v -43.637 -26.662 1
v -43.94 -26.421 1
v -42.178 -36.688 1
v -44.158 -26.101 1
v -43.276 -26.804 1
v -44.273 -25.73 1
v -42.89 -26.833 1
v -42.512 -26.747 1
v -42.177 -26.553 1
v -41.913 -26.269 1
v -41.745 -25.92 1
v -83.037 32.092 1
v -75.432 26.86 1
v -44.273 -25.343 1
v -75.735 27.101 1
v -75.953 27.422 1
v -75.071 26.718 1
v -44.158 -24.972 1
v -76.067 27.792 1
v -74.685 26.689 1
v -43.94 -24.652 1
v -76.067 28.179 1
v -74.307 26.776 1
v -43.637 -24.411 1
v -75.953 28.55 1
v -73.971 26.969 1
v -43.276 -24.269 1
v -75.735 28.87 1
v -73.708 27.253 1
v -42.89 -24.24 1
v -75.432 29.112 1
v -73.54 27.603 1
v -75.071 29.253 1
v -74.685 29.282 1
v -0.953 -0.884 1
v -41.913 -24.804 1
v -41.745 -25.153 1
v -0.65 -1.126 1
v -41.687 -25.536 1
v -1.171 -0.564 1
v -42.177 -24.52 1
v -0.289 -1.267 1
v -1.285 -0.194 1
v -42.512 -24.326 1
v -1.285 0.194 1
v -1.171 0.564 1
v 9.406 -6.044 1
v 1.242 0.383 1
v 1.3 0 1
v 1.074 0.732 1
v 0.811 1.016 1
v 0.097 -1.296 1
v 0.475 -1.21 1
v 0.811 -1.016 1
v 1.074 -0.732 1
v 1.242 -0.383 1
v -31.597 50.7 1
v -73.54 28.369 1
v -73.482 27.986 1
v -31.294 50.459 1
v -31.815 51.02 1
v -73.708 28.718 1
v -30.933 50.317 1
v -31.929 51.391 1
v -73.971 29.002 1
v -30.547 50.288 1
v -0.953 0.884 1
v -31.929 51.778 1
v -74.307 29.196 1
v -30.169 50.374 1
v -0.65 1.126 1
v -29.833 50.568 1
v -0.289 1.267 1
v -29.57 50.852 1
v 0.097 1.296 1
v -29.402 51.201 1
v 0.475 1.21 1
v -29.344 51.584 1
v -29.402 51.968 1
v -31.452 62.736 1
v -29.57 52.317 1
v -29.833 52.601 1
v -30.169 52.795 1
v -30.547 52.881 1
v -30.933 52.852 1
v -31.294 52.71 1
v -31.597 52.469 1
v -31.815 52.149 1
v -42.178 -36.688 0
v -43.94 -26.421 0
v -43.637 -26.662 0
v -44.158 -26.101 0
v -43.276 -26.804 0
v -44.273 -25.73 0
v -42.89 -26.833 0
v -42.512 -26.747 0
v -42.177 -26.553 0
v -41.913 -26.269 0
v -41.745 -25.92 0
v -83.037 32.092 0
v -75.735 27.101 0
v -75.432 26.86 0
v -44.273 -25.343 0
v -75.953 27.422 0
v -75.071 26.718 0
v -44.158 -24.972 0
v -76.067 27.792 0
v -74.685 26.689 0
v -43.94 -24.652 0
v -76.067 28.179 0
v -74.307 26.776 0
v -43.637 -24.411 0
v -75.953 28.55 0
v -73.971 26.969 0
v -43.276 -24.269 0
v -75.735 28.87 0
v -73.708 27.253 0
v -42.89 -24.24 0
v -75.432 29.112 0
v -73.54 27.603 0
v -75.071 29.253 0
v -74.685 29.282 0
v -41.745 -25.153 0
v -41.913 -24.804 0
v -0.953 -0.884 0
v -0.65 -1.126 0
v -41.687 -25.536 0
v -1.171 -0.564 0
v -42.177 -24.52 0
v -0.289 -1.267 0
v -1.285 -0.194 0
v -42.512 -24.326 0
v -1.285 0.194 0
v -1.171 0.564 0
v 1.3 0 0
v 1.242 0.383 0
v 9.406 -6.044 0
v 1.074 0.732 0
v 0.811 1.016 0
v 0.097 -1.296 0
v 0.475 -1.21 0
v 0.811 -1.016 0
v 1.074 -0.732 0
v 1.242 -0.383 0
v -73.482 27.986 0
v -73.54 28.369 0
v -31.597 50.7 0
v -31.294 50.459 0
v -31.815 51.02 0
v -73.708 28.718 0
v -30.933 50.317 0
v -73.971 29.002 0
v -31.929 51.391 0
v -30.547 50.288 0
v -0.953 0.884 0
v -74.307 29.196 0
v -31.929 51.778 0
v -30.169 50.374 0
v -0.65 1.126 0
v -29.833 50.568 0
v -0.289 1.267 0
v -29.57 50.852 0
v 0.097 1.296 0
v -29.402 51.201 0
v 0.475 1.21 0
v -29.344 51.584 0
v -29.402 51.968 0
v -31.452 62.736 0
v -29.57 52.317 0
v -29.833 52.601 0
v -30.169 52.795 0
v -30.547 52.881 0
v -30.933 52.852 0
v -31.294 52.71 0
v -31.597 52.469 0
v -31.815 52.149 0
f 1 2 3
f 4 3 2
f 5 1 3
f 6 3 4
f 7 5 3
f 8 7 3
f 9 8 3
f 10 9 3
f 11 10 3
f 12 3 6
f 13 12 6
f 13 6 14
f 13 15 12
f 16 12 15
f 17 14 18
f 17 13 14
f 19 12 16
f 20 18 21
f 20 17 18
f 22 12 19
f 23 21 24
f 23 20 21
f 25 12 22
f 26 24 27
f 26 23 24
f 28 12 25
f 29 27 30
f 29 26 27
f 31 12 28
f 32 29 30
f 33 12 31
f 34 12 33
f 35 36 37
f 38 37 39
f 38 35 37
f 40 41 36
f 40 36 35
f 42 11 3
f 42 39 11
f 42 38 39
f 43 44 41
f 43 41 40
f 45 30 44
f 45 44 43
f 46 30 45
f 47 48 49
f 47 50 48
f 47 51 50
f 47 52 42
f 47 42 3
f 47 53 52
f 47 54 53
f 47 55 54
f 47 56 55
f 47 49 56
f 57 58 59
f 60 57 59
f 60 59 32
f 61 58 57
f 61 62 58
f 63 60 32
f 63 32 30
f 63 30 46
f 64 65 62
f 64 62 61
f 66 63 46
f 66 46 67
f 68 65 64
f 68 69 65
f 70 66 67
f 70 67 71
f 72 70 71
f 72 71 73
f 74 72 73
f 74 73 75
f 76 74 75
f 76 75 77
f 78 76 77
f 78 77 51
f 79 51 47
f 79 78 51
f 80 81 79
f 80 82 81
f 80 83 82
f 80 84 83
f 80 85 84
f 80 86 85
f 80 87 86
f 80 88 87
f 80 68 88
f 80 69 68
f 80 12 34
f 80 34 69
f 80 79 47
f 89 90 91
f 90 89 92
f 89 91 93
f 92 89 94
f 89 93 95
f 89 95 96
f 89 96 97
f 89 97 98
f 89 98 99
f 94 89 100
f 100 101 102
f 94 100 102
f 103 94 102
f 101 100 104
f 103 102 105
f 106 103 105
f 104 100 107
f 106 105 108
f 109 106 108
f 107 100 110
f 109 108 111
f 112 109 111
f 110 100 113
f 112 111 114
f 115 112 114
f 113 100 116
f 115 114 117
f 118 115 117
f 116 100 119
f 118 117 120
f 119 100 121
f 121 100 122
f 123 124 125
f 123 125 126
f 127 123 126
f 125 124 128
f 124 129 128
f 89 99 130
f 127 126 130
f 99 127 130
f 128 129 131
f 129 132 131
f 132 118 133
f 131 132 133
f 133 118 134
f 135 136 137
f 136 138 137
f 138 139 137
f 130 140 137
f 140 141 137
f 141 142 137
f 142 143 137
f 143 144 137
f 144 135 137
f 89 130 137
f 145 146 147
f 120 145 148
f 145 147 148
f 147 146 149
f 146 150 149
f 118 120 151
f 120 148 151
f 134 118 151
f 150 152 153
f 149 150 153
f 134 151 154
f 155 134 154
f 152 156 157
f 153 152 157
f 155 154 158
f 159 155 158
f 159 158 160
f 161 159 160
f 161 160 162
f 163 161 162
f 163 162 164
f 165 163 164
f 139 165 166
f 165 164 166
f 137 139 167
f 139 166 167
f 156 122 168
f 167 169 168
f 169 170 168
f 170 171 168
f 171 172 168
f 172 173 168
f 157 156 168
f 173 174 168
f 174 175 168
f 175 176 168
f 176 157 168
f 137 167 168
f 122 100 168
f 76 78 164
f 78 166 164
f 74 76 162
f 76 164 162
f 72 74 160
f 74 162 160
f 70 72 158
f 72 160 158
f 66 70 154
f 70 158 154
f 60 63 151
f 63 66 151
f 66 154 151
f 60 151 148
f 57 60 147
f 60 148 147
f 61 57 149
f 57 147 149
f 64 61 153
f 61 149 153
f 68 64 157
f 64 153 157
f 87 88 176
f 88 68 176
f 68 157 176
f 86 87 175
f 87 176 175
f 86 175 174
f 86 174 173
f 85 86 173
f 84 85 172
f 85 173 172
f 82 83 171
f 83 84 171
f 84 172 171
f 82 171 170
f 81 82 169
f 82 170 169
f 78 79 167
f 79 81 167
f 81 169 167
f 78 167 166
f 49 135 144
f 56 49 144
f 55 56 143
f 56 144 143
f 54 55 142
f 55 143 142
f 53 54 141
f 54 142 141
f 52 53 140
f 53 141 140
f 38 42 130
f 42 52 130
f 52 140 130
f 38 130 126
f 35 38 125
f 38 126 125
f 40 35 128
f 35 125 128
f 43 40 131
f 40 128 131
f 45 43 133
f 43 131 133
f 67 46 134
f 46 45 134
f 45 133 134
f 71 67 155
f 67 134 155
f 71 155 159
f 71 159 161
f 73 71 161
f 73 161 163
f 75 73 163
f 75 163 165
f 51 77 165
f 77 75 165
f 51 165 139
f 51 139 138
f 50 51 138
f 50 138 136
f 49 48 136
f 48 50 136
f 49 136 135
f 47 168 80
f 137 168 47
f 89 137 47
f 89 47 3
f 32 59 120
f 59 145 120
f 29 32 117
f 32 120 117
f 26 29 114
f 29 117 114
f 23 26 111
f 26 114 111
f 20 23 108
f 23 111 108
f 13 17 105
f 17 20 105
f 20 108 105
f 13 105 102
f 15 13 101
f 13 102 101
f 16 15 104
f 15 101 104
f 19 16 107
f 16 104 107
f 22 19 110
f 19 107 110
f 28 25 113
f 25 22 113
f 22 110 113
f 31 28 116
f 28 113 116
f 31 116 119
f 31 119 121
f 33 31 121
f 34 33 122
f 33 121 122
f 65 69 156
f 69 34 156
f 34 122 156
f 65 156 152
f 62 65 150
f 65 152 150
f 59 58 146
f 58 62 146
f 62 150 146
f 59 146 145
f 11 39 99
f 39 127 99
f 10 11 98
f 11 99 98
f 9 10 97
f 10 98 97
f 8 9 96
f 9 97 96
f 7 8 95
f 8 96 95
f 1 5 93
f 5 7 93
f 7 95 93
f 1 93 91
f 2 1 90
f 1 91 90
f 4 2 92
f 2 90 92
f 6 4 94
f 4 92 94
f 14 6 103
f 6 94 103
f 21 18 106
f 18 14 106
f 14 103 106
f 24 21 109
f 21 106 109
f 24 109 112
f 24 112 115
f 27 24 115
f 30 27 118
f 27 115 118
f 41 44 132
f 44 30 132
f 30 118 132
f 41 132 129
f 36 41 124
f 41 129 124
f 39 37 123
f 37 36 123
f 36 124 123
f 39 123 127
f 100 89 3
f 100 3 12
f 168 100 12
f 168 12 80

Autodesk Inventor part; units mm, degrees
ref_plane "YZ Plane" through (0, 0, 0) normal (1, 0, 0) x (0, 1, 0)
ref_plane "XZ Plane" through (0, 0, 0) normal (0, 1, 0) x (-1, 0, 0)
ref_plane "XY Plane" through (0, 0, 0) normal (0, 0, 1) x (1, 0, 0)
sketch "スケッチ1" plane through (0, 0, 0) normal (0, 0, 1) x (1, 0, 0)
  line L0 (9.406, -6.0438) -> (-42.1785, -36.6875)
  line L1 (-42.1785, -36.6875) -> (-83.0369, 32.0918)
  line L2 (-83.0369, 32.0918) -> (-31.4524, 62.7355)
  line L3 (-31.4524, 62.7355) -> (9.406, -6.0438)
  circle A0 centre (-42.9871, -25.5365) radius 1.3 projected
  circle A1 centre (-74.7819, 27.9857) radius 1.3 projected
  circle A2 centre (-30.6438, 51.5845) radius 1.3 projected
  circle A3 centre (0, 0) radius 1.3 projected
  line L4 (-30.6438, 51.5845) -> (-26.3451, 54.1381) construction
  line L5 (-30.6438, 51.5845) -> (-35.7511, 60.1819) construction
  line L6 (-42.9871, -25.5365) -> (-47.2858, -28.0901) construction
  line L7 (-42.9871, -25.5365) -> (-37.8798, -34.1339) construction
  line L8 (-74.7819, 27.9857) -> (-78.7381, 34.6454) construction
  line L9 (-74.7819, 27.9857) -> (-79.0806, 25.432) construction
  line L10 (0, 0) -> (4.2987, 2.5536) construction
  line L11 (0, 0) -> (5.1073, -8.5974) construction
  point P0 (0, 0)
  dimension "d2" = 80
  dimension "d3" = 60
extrude "押し出し1" add sketch "スケッチ1" along normal blind 1
properties part number "ThirdPlate"
